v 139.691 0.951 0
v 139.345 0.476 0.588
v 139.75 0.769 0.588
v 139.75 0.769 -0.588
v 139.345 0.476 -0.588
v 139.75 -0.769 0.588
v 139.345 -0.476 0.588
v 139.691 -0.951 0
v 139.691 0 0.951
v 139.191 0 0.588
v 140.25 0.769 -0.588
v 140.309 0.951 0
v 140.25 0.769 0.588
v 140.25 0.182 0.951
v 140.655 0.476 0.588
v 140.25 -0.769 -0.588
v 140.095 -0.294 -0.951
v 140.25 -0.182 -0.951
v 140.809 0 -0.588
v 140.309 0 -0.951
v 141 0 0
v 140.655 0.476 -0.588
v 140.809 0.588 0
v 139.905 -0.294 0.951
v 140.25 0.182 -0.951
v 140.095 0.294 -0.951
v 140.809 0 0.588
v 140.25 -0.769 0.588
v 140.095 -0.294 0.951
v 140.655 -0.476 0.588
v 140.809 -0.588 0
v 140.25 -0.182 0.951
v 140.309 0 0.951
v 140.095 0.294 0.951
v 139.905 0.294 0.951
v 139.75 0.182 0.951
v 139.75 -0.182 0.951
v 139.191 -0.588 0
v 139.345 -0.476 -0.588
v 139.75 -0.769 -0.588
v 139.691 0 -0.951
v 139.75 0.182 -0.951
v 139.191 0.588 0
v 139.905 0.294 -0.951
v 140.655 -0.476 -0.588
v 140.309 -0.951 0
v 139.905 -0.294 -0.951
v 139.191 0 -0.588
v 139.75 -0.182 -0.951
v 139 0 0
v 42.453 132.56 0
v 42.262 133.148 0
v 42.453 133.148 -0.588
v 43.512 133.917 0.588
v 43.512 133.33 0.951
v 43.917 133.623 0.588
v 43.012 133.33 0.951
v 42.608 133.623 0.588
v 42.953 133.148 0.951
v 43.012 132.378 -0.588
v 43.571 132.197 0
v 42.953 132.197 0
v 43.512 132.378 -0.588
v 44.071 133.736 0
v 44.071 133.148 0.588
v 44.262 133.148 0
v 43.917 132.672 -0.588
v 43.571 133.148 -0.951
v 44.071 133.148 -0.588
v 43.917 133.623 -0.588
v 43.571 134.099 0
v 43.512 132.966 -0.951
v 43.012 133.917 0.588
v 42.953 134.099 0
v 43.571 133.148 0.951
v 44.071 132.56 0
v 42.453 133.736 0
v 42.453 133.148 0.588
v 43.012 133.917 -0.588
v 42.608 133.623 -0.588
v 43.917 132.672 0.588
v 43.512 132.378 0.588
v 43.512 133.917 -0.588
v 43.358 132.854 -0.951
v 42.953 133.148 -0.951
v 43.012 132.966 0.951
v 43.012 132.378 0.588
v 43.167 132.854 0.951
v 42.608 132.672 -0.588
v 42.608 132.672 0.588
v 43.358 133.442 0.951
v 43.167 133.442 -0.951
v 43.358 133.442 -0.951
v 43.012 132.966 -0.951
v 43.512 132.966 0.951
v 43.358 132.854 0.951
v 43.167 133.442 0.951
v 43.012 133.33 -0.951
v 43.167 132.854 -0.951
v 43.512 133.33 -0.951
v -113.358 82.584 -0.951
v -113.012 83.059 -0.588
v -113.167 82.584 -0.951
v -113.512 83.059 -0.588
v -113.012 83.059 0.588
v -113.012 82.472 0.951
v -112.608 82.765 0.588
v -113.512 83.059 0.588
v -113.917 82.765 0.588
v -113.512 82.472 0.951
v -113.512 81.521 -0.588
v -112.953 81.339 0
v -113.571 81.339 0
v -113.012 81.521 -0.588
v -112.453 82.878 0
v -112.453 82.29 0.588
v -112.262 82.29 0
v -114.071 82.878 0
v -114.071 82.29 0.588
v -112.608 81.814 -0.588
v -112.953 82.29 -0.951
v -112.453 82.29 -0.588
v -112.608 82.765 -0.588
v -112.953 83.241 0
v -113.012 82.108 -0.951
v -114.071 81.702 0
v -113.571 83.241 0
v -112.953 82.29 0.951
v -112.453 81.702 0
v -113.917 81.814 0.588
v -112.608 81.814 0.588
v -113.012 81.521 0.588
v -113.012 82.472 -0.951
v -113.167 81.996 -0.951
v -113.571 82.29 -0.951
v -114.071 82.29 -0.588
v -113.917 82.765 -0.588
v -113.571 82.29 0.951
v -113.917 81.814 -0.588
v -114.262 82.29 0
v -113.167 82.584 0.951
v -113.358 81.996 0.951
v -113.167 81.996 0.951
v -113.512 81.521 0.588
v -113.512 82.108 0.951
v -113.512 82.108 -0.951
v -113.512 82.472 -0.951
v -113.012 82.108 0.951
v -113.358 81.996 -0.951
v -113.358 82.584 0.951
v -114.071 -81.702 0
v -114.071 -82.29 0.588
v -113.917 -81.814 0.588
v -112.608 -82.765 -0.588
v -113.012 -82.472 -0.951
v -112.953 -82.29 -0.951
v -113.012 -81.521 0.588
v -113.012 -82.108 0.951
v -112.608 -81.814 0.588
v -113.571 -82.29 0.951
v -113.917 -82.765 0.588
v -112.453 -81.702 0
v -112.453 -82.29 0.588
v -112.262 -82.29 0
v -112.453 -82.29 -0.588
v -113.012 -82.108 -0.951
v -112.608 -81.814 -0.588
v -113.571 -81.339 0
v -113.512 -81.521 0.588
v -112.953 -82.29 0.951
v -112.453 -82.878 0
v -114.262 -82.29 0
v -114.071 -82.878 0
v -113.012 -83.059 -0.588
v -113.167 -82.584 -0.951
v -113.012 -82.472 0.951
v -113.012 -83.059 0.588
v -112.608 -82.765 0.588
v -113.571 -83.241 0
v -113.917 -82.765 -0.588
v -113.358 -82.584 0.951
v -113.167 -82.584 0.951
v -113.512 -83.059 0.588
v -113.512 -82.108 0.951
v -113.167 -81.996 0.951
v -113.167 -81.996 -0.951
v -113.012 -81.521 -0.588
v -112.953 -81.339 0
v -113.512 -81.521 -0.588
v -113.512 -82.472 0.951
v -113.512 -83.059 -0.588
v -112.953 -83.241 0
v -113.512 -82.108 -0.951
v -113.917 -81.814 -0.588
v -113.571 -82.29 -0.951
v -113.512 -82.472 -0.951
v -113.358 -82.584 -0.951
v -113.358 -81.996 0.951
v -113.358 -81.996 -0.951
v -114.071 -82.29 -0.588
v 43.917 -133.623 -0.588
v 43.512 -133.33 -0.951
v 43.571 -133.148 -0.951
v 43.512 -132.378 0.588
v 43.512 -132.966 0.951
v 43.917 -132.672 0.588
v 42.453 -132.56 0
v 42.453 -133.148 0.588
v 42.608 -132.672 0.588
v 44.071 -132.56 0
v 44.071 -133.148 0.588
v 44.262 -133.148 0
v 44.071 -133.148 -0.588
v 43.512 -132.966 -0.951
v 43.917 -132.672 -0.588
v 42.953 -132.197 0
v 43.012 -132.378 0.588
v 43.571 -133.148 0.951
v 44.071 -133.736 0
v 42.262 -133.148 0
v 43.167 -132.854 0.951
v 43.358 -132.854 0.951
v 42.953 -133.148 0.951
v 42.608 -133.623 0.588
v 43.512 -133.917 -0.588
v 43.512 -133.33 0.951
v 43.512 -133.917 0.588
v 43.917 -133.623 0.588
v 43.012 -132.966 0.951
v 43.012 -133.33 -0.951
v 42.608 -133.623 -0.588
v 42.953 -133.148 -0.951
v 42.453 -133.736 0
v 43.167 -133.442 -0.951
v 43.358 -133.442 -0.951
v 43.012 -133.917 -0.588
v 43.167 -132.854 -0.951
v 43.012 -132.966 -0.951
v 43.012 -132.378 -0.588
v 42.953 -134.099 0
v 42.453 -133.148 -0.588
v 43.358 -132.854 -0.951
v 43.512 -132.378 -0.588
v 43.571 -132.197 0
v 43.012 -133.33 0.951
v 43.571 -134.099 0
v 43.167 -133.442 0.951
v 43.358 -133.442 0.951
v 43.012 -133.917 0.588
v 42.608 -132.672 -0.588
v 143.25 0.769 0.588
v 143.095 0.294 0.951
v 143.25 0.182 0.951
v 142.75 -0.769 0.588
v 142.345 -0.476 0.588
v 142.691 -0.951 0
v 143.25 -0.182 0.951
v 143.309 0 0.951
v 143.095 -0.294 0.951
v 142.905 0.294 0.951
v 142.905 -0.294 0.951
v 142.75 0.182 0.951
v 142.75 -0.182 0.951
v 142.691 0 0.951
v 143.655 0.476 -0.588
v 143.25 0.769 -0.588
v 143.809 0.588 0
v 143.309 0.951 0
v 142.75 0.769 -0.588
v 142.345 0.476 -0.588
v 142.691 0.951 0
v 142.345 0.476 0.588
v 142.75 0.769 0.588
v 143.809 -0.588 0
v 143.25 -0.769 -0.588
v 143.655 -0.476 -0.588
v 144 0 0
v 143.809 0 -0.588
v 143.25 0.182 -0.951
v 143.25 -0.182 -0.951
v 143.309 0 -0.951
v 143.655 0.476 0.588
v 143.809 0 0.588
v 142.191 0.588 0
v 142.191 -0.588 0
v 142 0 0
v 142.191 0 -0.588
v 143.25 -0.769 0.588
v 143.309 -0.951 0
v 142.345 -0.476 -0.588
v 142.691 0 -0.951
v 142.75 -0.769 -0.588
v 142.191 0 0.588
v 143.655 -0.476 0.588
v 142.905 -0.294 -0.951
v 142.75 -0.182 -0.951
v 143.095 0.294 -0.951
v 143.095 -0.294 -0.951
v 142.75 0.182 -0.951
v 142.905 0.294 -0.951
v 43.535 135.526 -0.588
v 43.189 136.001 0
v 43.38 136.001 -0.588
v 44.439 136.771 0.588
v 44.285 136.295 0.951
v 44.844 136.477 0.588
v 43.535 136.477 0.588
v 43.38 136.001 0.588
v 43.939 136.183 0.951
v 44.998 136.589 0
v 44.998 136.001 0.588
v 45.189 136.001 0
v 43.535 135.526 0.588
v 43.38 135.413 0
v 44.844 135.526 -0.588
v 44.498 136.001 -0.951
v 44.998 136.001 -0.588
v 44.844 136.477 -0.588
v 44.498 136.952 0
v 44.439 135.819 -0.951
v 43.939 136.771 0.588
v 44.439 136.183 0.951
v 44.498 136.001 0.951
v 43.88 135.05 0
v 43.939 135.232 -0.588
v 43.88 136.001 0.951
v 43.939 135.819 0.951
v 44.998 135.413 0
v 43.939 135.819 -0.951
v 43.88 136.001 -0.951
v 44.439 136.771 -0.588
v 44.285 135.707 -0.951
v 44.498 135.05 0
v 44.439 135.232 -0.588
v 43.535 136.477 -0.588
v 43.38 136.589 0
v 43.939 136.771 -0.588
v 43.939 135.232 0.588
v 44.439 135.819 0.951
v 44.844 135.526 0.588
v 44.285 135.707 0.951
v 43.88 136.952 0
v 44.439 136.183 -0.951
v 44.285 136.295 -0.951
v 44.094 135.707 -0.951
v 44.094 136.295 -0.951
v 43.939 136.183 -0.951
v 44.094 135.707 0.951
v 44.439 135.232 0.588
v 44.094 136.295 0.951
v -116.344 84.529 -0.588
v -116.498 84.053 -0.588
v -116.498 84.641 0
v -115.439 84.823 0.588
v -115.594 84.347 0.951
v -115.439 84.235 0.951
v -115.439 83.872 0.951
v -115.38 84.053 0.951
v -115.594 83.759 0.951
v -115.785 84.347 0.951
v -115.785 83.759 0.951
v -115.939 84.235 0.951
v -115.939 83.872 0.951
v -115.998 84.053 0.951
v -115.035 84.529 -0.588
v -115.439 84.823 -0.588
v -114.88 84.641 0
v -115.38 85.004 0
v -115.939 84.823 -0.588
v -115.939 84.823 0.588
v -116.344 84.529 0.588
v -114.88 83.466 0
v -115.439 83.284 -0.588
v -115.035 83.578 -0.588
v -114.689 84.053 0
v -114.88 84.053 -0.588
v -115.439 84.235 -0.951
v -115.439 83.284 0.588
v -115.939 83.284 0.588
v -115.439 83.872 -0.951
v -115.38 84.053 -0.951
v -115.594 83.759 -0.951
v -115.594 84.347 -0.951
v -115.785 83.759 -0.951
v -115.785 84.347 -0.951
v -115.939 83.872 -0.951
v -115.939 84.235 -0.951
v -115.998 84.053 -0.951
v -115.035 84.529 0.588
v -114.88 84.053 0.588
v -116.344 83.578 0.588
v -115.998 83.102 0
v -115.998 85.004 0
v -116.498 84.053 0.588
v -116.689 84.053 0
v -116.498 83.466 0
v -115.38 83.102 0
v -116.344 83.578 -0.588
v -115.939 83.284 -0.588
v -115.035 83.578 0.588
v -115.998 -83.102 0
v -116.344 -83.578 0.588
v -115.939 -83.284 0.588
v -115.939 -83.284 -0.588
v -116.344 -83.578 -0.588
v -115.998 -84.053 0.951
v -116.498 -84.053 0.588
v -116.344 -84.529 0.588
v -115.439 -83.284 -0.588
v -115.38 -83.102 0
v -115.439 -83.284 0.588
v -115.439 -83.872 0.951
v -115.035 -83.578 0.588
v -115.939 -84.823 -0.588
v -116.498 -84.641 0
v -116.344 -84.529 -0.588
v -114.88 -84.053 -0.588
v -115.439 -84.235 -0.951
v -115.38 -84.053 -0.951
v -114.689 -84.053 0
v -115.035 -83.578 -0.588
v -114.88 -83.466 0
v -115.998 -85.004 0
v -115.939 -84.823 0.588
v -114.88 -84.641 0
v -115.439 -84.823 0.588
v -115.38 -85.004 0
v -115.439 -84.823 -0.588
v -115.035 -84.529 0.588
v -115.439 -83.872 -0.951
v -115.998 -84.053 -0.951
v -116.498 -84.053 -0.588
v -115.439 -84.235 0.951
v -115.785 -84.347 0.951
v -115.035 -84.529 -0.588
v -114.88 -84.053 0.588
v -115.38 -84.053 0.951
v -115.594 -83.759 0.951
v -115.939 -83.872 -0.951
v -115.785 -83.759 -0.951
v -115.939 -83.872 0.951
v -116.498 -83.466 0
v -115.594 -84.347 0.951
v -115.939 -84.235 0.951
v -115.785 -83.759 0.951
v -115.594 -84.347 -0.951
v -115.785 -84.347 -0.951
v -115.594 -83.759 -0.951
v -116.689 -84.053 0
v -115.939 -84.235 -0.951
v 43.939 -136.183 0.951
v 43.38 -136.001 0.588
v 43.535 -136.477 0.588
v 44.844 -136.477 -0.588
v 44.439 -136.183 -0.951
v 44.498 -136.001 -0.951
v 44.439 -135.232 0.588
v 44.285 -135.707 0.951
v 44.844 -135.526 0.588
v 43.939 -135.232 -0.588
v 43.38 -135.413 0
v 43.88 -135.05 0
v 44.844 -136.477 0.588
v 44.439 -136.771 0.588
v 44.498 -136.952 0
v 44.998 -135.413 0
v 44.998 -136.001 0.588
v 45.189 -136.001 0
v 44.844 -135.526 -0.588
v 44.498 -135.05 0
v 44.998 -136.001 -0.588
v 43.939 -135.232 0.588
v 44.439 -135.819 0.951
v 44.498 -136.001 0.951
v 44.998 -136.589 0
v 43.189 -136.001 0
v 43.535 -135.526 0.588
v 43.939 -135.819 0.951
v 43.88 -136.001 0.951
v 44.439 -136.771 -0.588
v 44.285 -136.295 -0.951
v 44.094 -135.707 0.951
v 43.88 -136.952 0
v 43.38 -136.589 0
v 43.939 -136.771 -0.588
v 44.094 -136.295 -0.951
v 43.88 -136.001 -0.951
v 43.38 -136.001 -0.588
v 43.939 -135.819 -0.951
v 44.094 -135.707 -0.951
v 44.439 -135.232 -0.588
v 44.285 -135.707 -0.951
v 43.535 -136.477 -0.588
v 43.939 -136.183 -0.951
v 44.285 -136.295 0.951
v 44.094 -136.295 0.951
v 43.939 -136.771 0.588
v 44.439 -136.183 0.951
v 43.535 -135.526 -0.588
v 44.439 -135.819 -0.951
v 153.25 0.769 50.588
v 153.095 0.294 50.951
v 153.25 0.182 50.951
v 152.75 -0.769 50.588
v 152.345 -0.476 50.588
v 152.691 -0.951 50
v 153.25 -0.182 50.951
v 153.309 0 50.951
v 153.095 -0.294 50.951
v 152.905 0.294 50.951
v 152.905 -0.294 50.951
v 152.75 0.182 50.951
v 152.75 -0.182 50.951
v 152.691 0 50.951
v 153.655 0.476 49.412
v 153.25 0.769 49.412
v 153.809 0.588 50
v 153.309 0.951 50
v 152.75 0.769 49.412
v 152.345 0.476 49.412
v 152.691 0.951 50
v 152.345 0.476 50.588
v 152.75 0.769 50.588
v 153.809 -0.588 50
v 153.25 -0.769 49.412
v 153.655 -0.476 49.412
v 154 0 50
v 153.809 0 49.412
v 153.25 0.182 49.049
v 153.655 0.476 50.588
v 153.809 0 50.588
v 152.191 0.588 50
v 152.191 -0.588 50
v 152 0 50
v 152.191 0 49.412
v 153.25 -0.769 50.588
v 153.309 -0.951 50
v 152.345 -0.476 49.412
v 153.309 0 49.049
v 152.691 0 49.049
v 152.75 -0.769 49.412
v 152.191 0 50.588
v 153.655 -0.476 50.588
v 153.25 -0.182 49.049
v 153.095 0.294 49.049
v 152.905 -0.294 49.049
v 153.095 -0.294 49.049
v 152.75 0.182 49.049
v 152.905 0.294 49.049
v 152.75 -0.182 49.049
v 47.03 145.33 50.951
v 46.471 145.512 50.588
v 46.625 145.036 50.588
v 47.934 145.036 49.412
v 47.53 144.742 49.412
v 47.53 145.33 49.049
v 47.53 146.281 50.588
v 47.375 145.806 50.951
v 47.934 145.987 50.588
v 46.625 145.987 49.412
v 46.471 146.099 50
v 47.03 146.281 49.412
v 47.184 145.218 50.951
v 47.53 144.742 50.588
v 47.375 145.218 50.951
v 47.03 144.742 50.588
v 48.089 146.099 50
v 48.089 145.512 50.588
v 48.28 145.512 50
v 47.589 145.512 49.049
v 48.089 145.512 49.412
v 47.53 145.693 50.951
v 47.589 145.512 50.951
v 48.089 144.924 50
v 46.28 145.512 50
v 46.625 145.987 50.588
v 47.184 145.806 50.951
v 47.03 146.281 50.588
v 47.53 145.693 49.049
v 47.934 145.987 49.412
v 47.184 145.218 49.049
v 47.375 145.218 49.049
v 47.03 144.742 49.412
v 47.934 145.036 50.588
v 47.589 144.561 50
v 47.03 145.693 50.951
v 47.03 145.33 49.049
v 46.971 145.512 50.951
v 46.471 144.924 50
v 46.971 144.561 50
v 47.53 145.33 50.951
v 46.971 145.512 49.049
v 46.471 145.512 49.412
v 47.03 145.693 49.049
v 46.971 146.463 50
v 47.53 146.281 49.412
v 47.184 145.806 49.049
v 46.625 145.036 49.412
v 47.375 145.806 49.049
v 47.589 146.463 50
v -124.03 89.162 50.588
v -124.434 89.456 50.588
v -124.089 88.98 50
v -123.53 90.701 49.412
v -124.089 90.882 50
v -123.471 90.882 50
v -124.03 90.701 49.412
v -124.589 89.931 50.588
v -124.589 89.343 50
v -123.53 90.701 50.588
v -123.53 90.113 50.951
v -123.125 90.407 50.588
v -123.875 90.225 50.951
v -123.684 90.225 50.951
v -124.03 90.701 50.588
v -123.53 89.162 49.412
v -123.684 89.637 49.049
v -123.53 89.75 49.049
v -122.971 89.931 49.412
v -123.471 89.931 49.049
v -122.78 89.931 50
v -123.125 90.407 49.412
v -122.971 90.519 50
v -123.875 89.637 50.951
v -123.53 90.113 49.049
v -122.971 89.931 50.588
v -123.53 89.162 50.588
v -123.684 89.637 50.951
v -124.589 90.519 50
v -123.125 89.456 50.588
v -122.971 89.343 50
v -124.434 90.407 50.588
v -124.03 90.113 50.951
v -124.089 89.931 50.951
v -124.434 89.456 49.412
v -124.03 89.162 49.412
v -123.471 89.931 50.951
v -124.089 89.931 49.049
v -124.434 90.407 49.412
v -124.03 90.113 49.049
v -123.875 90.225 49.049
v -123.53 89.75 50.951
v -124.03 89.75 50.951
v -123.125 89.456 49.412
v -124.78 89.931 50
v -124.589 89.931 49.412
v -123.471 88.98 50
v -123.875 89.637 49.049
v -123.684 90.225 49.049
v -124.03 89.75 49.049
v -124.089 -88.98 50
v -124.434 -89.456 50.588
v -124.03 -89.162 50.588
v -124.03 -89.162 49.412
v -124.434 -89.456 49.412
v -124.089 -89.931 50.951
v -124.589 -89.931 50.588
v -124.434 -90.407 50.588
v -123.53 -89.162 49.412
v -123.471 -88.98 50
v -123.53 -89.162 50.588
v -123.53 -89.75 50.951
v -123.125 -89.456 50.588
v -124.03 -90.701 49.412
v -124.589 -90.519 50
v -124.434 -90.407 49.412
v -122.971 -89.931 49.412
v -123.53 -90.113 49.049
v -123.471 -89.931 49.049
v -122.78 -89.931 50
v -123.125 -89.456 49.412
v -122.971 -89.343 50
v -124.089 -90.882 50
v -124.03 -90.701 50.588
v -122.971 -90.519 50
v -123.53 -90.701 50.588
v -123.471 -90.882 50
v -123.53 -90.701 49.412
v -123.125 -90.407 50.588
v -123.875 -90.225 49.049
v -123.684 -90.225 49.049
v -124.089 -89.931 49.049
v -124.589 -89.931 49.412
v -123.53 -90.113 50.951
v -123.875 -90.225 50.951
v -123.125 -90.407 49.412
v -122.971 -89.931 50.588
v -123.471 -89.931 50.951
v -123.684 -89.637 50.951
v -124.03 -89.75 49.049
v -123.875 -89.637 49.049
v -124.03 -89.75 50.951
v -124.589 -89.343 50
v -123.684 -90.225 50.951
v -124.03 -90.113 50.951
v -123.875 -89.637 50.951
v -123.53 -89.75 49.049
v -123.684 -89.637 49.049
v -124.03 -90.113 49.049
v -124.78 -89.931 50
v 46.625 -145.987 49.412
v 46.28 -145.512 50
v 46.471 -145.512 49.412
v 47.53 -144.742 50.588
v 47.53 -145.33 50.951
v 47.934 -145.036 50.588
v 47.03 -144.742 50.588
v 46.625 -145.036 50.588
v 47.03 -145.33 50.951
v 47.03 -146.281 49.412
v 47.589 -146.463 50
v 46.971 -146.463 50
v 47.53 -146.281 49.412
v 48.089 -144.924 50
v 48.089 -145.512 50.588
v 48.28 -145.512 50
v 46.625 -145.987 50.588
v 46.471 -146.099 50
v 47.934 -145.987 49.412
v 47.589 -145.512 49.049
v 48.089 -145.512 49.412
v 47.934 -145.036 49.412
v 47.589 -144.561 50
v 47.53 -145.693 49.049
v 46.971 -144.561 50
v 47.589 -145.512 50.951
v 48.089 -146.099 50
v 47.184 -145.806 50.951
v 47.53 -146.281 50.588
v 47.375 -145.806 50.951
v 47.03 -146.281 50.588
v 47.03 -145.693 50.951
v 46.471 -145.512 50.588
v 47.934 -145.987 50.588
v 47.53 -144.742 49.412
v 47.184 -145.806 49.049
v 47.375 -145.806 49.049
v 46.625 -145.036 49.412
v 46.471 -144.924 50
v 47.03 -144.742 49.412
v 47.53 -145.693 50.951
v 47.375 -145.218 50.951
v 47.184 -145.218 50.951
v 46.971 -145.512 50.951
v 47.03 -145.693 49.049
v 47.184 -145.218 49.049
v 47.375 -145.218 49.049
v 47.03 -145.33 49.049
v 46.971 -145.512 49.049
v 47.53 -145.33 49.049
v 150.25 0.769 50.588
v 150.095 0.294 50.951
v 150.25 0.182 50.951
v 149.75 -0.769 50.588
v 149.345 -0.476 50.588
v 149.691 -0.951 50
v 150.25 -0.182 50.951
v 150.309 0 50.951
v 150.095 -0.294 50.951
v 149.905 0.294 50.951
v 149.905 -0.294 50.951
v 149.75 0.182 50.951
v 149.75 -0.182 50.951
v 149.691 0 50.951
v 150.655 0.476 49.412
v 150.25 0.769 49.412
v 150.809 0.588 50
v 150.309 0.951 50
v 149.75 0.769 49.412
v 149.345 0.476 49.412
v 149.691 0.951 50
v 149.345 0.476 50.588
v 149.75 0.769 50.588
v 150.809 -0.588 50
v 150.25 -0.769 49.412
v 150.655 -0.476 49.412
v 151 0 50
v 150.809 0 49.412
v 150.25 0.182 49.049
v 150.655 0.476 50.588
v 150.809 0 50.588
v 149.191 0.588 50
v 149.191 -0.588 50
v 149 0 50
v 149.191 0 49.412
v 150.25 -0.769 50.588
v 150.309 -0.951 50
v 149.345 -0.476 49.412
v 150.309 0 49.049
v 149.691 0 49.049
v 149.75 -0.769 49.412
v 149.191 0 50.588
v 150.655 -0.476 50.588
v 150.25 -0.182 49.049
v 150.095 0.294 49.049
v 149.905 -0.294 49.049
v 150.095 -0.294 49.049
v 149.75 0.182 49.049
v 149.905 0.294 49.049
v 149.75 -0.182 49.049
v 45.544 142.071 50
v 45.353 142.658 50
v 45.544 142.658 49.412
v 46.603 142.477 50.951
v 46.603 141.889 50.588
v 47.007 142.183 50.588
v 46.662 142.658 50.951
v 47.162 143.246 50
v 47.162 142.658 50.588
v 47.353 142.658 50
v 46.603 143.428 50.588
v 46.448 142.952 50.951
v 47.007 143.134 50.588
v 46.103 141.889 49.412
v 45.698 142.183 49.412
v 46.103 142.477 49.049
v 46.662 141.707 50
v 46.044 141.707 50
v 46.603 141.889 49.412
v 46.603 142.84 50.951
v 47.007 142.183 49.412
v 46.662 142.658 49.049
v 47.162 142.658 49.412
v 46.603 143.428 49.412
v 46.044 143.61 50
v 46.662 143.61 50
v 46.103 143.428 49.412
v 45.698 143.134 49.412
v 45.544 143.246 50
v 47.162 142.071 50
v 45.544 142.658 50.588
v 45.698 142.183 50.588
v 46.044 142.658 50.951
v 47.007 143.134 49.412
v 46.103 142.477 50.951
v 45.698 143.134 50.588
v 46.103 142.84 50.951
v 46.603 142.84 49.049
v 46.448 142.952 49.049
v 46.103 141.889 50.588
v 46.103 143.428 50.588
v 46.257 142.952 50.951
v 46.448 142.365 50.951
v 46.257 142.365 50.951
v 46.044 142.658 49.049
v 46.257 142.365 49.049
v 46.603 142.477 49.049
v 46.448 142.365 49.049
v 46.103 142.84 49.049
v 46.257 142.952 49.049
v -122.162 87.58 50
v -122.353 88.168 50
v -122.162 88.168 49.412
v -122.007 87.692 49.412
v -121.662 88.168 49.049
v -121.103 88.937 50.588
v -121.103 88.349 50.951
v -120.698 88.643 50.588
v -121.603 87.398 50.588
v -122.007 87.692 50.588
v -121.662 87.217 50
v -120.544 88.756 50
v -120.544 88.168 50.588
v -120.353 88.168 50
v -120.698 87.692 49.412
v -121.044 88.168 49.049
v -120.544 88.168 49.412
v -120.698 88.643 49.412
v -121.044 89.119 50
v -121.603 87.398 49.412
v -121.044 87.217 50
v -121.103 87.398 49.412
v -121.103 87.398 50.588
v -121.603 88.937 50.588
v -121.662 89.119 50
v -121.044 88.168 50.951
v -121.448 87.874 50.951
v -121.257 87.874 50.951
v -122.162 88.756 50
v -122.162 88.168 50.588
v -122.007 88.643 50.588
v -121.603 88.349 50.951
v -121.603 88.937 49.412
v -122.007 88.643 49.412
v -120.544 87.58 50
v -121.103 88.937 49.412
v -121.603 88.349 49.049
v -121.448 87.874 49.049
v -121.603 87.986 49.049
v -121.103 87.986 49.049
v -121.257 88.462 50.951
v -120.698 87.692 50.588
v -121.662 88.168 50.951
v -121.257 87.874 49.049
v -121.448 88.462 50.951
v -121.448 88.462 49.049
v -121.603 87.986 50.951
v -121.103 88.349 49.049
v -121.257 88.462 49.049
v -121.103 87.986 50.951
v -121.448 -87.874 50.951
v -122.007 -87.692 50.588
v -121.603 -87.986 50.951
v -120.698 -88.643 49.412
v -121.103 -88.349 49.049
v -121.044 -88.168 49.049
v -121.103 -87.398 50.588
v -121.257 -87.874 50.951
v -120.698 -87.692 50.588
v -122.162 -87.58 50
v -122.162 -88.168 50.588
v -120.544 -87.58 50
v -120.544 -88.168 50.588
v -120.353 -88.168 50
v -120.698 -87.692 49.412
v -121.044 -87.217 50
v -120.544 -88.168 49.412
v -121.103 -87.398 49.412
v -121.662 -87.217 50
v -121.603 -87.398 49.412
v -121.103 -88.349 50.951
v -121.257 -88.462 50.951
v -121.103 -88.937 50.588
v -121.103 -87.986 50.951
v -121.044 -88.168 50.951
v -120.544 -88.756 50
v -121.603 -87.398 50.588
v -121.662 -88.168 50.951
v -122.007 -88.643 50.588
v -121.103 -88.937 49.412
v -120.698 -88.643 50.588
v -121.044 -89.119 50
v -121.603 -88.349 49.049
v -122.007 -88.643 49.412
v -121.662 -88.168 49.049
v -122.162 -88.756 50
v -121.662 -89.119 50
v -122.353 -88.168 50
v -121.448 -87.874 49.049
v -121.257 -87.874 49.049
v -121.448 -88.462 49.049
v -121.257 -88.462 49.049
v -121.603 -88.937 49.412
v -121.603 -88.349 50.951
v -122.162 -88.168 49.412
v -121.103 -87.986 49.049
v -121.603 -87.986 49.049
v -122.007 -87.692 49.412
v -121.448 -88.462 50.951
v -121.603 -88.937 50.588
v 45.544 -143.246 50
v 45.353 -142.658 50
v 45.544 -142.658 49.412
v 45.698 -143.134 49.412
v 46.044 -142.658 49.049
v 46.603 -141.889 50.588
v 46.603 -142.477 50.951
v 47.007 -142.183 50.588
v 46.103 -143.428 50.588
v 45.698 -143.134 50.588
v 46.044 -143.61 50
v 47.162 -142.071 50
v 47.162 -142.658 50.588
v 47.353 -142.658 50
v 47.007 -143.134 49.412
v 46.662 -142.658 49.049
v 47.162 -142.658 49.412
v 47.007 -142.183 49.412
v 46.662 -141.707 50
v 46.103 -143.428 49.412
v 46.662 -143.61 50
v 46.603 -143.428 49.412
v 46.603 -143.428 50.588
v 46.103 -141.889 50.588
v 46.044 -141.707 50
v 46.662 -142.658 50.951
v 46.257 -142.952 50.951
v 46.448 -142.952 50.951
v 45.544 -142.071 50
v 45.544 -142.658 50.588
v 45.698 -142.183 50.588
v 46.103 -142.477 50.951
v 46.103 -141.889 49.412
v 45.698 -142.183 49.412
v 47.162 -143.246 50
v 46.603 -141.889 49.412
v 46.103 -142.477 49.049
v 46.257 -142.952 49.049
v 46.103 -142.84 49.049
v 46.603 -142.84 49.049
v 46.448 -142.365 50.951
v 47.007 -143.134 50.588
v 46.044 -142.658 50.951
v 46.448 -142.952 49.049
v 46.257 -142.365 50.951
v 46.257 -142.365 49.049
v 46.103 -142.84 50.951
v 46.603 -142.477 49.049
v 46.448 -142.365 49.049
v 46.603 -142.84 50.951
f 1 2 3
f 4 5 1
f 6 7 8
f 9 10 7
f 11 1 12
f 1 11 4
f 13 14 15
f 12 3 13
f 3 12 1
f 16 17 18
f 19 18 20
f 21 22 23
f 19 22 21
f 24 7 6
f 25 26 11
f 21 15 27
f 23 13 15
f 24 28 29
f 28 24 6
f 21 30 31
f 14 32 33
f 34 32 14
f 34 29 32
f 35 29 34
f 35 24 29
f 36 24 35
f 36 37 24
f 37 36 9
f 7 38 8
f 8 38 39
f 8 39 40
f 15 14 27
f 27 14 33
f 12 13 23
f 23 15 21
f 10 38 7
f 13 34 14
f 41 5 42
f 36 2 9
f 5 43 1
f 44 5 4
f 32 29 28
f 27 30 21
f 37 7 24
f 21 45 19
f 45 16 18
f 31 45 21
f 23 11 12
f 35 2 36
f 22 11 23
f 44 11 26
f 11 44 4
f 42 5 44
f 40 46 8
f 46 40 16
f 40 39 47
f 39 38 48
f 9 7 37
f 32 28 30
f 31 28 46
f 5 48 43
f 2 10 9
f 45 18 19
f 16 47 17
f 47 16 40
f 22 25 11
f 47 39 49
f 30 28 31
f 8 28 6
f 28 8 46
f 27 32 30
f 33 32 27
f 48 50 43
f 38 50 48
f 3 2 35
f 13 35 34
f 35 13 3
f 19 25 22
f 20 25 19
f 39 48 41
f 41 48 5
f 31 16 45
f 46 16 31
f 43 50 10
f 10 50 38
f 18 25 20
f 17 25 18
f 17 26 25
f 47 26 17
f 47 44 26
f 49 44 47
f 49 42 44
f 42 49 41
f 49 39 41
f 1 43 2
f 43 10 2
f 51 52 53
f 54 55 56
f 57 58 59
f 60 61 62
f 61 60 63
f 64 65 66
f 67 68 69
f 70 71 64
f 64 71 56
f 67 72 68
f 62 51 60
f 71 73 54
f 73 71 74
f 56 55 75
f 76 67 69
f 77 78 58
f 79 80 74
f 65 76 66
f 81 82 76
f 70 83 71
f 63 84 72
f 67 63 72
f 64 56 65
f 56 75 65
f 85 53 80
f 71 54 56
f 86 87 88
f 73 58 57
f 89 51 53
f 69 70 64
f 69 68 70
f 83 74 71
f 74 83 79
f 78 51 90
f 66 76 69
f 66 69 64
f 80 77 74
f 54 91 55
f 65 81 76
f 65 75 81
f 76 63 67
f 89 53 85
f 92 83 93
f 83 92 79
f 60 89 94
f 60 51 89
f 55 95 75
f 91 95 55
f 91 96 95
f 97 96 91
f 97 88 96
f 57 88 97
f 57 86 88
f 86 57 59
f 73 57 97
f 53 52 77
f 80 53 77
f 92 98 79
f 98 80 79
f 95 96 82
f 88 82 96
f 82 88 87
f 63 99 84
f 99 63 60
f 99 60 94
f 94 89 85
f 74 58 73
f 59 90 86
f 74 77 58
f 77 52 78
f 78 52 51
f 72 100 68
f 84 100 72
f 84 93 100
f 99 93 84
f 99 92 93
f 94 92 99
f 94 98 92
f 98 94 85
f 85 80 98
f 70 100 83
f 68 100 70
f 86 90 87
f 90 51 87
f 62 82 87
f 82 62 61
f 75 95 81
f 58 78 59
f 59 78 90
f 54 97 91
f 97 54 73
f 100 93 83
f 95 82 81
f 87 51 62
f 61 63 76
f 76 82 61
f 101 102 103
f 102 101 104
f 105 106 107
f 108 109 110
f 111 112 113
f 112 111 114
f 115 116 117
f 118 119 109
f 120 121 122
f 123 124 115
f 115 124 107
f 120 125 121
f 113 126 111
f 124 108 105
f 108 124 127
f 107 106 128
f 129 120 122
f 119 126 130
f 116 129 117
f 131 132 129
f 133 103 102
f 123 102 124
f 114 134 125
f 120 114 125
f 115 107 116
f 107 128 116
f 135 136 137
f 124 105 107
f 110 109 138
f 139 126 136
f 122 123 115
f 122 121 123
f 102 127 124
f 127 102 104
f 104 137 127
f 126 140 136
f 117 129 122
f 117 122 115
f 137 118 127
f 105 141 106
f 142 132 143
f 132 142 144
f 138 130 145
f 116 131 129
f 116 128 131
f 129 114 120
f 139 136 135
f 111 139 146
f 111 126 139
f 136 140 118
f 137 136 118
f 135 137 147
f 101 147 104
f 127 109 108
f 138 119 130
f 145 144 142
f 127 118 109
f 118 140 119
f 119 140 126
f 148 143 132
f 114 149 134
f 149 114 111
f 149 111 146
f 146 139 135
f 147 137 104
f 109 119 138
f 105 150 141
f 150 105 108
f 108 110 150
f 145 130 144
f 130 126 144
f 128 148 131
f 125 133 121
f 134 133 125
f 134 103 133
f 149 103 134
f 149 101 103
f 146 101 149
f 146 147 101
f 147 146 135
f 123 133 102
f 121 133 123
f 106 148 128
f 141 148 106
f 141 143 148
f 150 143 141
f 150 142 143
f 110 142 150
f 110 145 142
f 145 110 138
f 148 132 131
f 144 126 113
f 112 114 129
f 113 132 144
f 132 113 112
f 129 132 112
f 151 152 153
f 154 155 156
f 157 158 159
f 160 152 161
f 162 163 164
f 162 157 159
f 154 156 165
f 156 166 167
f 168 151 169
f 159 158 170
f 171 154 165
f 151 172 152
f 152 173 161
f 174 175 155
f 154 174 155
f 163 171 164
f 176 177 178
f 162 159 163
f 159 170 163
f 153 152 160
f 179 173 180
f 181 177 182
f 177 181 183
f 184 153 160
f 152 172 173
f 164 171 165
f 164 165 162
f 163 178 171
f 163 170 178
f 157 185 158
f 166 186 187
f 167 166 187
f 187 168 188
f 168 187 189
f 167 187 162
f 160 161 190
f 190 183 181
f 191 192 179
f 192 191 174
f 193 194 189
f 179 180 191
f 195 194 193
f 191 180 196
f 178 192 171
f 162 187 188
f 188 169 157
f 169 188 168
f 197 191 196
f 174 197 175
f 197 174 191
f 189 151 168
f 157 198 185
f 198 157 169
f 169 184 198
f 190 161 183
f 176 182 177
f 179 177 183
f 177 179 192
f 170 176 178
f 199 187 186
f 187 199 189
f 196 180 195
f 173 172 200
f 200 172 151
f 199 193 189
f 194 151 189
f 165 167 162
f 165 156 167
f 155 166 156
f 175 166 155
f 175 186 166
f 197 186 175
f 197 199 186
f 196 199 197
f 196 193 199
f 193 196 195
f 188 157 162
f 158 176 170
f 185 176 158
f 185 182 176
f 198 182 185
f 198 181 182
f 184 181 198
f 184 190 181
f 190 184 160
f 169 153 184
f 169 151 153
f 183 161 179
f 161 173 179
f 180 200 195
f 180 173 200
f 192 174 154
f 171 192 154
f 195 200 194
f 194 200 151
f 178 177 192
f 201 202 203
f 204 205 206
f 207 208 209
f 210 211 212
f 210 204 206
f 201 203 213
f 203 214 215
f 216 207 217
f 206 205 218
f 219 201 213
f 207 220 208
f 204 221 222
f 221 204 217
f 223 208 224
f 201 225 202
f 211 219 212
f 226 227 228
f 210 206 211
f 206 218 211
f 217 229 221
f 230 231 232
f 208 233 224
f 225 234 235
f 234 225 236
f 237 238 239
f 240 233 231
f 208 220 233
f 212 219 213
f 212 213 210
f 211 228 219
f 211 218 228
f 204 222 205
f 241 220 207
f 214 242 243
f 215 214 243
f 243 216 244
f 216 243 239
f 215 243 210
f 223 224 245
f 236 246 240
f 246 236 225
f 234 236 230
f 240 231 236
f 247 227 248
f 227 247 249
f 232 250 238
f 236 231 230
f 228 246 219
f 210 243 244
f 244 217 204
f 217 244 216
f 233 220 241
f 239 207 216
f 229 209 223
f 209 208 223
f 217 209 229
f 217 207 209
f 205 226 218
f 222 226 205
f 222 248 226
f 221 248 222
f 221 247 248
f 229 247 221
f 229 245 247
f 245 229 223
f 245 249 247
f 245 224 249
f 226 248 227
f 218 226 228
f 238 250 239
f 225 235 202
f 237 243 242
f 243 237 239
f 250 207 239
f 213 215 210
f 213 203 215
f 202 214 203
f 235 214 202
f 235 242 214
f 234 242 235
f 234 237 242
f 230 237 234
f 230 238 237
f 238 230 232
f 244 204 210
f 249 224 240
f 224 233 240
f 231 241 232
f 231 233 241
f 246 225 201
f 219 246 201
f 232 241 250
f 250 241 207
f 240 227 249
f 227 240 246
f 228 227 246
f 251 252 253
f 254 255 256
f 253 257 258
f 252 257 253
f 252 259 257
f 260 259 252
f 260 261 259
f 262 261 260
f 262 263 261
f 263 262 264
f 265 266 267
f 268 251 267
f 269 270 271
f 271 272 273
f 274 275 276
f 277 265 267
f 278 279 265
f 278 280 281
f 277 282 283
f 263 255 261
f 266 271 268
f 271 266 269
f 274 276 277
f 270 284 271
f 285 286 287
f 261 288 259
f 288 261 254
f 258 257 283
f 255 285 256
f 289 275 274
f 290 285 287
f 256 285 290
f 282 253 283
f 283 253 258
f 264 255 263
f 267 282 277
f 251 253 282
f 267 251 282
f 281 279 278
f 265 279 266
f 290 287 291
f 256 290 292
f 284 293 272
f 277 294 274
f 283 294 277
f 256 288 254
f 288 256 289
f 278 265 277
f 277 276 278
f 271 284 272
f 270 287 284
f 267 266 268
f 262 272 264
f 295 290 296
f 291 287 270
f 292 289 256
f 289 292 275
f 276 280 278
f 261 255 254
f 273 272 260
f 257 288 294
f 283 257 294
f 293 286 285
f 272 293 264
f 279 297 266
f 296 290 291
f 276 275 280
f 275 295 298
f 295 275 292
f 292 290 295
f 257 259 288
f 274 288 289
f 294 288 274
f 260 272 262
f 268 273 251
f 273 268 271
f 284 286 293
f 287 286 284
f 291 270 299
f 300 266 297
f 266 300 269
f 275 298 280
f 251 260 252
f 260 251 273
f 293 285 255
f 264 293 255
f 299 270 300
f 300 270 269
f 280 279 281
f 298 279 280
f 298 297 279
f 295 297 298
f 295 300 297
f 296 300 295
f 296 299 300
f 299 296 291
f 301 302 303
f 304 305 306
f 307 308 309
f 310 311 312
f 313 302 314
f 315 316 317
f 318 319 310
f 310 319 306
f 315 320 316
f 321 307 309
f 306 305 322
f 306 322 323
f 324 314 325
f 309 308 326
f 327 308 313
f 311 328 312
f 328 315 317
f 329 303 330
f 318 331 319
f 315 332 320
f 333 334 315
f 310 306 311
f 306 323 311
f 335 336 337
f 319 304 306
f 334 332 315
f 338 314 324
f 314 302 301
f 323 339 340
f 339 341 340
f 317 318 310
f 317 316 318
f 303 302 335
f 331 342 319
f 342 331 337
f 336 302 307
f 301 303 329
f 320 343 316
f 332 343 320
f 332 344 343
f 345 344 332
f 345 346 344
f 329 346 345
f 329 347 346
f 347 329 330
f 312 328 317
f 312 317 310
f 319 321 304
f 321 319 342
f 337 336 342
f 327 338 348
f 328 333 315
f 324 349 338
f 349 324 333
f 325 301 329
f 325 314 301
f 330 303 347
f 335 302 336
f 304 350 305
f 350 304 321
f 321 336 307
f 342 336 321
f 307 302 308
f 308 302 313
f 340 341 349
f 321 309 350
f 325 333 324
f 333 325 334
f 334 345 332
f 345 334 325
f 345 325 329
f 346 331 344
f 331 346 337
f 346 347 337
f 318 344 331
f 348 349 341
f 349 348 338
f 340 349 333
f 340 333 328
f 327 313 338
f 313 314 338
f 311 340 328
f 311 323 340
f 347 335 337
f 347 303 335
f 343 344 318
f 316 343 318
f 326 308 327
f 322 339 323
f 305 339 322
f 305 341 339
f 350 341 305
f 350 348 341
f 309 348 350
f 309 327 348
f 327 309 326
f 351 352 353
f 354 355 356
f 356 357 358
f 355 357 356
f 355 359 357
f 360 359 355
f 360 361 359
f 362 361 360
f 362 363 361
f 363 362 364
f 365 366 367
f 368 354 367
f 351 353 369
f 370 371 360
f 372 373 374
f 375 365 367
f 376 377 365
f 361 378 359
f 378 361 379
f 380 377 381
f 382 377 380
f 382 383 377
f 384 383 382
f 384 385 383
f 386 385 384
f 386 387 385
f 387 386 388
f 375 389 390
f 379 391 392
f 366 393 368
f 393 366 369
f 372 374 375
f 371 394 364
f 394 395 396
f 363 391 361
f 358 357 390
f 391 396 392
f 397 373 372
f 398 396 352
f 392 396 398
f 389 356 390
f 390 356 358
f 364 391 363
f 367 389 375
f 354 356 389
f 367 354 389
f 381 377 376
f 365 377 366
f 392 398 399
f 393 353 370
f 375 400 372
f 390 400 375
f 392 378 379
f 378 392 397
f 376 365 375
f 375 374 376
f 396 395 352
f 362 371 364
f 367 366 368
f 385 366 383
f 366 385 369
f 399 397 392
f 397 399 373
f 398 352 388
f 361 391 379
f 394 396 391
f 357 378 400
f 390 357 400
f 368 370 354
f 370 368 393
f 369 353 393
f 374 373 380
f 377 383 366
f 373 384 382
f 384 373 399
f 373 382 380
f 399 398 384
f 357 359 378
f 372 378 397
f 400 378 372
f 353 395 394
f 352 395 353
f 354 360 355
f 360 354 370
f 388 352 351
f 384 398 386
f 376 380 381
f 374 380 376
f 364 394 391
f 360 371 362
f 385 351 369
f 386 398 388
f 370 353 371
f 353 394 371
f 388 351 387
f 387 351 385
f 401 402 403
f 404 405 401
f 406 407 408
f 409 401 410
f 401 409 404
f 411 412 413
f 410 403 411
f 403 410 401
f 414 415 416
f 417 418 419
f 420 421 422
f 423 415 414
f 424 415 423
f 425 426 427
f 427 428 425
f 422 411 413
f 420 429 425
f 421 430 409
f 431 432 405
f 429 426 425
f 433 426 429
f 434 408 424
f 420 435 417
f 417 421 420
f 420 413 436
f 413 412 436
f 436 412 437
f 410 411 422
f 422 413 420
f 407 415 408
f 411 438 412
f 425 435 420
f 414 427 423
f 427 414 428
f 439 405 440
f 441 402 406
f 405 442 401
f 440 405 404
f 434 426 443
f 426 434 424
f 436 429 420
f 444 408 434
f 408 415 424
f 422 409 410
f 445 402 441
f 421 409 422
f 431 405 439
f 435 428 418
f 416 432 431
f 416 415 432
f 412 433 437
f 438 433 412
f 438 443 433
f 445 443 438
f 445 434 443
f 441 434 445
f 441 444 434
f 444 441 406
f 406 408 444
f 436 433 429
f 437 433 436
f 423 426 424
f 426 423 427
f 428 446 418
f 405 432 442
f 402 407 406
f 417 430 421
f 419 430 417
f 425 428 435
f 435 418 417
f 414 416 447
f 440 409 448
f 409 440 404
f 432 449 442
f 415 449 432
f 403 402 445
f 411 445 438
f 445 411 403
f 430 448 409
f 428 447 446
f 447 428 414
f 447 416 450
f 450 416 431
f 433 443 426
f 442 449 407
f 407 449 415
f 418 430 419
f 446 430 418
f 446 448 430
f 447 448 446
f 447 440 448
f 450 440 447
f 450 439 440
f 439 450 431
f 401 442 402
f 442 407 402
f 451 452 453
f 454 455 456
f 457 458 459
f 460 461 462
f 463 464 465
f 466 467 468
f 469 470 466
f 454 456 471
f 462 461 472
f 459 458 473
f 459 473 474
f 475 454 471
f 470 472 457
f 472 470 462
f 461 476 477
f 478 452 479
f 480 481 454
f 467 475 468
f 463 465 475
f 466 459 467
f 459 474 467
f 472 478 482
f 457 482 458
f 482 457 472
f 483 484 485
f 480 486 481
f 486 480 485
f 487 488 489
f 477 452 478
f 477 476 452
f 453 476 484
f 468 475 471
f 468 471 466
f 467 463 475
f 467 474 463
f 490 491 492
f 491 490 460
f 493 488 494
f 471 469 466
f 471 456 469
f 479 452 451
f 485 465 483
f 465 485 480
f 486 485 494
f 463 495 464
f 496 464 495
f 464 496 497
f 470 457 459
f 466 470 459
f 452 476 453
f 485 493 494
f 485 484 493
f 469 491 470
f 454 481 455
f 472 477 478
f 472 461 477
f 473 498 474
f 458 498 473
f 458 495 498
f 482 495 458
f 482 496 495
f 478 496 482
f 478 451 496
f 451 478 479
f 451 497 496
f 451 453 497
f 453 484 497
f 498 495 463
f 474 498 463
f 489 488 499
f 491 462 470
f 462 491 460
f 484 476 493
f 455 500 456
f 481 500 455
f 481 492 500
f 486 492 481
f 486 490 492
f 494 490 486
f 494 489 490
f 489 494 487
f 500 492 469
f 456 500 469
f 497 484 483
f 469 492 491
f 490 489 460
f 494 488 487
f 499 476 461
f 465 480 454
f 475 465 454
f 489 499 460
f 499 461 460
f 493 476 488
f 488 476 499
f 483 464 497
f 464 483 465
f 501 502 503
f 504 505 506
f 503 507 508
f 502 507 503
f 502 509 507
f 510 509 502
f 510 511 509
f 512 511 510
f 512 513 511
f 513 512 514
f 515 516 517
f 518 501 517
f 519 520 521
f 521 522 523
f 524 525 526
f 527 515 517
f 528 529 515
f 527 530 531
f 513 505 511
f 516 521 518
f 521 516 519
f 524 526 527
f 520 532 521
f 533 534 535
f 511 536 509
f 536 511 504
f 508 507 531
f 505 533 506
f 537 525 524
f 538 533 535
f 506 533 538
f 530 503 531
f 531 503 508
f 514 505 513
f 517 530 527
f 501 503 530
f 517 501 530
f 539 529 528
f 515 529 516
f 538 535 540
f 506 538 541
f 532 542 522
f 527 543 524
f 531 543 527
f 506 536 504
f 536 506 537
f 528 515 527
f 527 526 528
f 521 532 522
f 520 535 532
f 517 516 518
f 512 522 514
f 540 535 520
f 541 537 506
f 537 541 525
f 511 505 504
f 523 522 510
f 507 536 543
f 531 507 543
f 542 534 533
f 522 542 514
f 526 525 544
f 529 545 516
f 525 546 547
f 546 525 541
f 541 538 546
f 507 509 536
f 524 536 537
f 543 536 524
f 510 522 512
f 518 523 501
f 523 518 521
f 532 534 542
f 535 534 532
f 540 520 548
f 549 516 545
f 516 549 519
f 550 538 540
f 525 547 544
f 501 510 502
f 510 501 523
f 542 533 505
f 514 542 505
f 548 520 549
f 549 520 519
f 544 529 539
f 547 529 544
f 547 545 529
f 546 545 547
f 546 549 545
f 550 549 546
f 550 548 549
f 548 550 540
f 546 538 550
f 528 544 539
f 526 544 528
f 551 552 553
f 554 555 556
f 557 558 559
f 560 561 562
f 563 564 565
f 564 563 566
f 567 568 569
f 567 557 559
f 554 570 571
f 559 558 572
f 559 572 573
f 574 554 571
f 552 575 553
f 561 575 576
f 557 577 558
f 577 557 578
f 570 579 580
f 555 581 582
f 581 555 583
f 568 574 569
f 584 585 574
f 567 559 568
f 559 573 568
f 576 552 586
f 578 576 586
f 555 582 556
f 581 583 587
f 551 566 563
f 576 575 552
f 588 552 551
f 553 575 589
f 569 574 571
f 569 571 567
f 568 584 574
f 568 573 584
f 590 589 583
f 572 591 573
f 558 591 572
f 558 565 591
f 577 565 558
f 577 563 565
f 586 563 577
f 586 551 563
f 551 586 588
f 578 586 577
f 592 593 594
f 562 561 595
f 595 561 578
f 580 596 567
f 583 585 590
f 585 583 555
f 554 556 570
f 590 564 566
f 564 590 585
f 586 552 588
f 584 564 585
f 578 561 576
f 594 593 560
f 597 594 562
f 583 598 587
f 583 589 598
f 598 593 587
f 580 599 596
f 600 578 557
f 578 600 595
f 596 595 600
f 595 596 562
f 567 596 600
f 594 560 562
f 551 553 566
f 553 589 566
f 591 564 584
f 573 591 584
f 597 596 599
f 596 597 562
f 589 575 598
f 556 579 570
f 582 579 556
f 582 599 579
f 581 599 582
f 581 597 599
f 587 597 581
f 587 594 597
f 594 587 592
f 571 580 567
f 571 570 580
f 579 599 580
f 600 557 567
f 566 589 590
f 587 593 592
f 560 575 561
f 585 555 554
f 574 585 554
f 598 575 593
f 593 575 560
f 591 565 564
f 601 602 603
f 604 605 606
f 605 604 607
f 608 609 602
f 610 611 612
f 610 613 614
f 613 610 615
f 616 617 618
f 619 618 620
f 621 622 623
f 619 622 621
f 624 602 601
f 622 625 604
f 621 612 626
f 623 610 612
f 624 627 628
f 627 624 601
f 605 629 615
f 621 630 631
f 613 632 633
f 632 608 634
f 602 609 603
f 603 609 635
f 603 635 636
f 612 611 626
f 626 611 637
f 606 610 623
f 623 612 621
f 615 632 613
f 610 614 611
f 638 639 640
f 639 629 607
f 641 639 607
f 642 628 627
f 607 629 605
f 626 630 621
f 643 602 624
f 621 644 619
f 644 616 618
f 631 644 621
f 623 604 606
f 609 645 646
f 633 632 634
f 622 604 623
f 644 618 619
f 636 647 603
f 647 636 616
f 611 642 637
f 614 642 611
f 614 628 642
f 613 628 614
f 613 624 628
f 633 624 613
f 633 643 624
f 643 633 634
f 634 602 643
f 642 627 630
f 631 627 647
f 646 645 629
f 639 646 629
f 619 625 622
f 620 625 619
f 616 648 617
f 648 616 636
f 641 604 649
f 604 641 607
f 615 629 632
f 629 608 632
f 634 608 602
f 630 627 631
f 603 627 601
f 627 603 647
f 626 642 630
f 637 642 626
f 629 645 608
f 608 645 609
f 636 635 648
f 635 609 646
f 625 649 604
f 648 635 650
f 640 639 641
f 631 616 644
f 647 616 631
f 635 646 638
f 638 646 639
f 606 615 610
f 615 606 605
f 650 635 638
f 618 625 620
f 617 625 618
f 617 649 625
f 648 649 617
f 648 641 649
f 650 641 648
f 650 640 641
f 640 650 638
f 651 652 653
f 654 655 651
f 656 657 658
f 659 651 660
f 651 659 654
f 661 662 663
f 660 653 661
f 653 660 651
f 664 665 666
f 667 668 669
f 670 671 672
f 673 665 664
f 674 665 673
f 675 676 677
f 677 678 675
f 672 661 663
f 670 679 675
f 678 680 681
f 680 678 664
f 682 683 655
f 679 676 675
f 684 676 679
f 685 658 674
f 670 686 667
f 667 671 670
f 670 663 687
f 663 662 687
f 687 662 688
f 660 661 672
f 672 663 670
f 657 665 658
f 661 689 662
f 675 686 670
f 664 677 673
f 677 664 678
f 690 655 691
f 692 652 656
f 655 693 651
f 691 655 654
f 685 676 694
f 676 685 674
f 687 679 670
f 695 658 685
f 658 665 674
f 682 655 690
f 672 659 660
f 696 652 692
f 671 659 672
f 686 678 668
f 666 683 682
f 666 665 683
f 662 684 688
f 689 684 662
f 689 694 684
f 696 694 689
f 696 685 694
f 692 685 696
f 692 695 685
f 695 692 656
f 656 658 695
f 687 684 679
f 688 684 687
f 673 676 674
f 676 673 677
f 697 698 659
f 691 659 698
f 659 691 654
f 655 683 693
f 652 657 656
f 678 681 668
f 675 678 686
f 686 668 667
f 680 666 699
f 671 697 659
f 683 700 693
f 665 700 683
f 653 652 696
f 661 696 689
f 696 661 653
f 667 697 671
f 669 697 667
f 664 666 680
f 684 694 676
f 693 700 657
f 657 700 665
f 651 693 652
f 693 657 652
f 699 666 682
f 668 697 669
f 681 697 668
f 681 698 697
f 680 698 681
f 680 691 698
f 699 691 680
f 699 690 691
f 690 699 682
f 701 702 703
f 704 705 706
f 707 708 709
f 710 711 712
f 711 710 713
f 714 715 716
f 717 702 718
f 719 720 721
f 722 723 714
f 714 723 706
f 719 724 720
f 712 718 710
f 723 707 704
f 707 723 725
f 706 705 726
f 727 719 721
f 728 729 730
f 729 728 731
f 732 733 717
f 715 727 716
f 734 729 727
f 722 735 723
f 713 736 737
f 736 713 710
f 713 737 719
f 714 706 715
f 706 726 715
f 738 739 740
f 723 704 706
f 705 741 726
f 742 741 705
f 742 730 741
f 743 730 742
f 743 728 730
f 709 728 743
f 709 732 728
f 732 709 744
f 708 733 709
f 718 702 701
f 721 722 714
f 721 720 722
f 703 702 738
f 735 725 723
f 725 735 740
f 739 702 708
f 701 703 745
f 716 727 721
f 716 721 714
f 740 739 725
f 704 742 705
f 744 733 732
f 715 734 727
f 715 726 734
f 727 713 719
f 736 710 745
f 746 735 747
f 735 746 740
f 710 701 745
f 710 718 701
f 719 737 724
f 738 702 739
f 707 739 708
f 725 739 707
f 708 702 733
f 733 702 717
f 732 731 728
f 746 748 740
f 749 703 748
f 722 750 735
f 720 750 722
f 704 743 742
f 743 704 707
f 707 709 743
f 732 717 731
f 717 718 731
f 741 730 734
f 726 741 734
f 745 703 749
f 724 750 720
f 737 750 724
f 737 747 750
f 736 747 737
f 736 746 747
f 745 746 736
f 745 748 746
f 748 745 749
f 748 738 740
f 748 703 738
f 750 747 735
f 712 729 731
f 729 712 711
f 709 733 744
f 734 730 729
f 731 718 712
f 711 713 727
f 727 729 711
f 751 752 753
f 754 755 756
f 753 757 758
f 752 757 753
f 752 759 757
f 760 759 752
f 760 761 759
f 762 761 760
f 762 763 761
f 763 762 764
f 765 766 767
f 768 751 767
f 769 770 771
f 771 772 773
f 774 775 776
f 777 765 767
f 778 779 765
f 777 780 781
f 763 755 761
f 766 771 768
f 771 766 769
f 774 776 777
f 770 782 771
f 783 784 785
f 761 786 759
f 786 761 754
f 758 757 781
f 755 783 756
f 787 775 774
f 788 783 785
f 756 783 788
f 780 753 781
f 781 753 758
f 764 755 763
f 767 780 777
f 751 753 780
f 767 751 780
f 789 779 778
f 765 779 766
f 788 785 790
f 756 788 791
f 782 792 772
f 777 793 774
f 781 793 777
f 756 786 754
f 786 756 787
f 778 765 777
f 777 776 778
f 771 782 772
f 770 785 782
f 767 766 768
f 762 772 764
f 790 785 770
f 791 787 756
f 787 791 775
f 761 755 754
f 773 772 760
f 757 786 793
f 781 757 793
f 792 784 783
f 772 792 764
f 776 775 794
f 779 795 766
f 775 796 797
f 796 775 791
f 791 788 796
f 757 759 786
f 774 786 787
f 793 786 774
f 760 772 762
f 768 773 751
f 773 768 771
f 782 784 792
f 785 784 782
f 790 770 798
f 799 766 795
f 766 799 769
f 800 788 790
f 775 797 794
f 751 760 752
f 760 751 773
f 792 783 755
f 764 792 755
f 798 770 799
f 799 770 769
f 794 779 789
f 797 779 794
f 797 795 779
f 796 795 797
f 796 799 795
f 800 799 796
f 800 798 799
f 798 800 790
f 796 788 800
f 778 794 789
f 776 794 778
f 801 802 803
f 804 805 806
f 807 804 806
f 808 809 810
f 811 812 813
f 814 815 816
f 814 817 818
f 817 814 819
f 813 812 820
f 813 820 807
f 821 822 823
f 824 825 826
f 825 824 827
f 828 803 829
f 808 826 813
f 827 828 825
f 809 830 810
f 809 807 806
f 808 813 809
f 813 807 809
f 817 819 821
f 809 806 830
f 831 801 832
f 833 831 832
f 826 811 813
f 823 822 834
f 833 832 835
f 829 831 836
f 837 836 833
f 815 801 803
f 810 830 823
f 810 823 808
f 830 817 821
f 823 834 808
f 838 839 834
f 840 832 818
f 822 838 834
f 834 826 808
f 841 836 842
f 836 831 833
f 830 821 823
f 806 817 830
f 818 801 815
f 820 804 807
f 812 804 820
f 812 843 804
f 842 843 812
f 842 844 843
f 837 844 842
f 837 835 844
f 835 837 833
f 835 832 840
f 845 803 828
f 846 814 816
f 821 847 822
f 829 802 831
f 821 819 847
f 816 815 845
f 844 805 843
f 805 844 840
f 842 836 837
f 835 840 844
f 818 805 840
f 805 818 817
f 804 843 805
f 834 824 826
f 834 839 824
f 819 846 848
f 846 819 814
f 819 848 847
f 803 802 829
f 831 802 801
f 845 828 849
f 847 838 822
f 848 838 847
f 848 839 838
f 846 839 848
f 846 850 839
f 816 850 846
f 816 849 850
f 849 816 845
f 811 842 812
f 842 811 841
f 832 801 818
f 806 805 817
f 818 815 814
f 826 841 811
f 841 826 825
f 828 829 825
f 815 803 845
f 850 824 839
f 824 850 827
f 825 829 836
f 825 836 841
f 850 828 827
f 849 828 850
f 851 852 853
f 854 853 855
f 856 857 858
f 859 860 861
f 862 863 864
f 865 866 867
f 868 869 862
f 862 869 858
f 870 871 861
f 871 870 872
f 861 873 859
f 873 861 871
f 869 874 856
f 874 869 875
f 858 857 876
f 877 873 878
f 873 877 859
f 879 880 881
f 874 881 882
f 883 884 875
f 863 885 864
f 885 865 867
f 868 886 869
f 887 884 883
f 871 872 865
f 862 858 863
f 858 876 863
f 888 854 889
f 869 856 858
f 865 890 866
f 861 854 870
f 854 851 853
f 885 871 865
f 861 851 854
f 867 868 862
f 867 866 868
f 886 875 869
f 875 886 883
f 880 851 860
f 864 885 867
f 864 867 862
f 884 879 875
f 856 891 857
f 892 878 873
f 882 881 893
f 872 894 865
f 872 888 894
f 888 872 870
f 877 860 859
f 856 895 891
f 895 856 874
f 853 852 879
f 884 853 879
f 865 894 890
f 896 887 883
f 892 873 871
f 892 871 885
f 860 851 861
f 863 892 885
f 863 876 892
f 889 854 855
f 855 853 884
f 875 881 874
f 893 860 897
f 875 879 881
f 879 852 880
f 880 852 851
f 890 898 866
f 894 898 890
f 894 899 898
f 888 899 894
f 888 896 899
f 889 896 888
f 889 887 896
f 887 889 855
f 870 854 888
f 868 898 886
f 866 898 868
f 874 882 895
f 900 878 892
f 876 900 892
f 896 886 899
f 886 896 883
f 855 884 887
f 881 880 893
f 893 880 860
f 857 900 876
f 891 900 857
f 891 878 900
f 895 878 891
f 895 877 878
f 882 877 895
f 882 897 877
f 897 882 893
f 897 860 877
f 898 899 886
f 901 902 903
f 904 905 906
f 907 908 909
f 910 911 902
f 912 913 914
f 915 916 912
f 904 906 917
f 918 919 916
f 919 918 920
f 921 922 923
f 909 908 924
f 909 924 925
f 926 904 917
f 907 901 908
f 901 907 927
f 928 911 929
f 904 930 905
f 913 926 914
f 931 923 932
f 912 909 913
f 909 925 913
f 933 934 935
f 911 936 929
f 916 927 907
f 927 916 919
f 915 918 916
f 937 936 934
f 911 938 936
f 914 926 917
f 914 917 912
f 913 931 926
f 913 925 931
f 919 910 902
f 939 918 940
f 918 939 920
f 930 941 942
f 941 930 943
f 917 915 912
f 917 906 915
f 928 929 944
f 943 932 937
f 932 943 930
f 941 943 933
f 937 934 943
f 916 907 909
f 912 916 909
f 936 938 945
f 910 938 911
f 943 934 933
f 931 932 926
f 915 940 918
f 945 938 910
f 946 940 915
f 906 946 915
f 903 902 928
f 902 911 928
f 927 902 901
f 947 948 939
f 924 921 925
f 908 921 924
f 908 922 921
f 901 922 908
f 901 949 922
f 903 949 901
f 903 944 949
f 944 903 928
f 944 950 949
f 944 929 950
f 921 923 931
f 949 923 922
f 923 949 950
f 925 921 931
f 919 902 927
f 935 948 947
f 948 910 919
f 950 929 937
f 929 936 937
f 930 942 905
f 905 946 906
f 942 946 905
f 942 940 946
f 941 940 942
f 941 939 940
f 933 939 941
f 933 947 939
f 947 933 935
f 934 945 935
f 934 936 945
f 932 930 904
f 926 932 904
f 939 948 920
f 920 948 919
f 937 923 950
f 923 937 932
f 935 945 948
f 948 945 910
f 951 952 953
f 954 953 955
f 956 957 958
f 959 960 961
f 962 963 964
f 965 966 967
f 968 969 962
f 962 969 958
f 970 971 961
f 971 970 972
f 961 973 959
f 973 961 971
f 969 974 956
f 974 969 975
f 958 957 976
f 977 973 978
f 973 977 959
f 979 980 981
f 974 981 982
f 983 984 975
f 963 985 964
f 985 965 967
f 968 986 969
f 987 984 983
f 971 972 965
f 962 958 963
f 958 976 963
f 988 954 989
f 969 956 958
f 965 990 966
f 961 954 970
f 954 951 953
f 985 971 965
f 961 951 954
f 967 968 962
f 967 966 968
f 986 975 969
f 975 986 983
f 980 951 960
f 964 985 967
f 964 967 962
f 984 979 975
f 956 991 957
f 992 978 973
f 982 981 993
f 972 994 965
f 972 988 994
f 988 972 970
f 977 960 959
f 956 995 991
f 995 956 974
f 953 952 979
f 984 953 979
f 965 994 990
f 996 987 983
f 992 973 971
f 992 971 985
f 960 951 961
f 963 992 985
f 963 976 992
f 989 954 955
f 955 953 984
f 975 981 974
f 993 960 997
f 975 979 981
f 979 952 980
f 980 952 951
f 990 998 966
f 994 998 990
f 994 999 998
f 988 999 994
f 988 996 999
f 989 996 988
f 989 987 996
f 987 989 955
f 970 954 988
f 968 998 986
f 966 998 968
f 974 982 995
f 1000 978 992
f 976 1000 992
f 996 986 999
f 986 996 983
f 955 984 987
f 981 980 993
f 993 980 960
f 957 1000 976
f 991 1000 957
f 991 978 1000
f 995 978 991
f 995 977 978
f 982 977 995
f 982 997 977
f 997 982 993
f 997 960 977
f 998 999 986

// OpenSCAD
function between_pts(pt1, pt2, steps=2) =
    assert(steps>1, "There must be at least two steps")
    [
        let(stop=steps-1, step=(pt2-pt1)/stop)
        for(i=[0:stop]) [pt1.x+step.x*i, pt1.y+step.y*i, pt1.z+step.z*i]
    ];

$fn=10;

function circle_list(r, height, steps=$fn) = [
    for(i=[0:steps-1]) [r*cos(360*i/steps), r*sin(360*i/steps), height]
];
// for(pt=circle_list(10, 0)) translate(pt) sphere(1);

function trap_sin(angle) = (
    // The trapezoidal sine function only distributes points evenly for
    // squares.  When used on a rectangle it generates the same number
    // of points on the short and long sides.
    let(angl_ = ((angle<0) ? 360-(-angle) : angle)%360)
    (angl_ < 45) ? angl_/45 :
    (angl_ < 135) ? 1 :
    (angl_ < 225) ? (180-angl_)/45 :
    (angl_ < 315) ? -1 :
                    (angl_-360)/45
);
function trap_cos(angle) = trap_sin(angle+90);

function man_sin(angle, x, y) = (
    // The true Manhattan sine function takes into account the angle
    // from the origin to x,y - not sure how to explain this.
    let(
        angl_ = ((angle<0) ? 360-(-angle) : angle)%360,
        break_angle = atan2(y, x)
    )
    (angl_ < break_angle) ? angl_/break_angle :
    (angl_ < (180 - break_angle)) ? 1 :
    (angl_ < (180 + break_angle)) ? (180-angl_)/break_angle :
    (angl_ < (360 - break_angle)) ? -1 :
                          (angl_-360)/break_angle
);
function man_cos(angle, x, y) = man_sin(angle+90, y, x);

function rectangle_list(x, y, height, steps=$fn) = [
    // for(i=[0:steps-1]) [x*trap_cos(360*i/steps), y*trap_sin(360*i/steps), height]
    for(i=[0:steps-1]) [x*man_cos(360*i/steps, x, y), y*man_sin(360*i/steps, x, y), height]
];

// for(pt=rectangle_list(160, 120, 1, steps=97*2)) translate(pt) color("green") sphere(1);

function band_points(band, bands, steps) = [
    let(all_steps=bands*steps, bandsm1 = bands-1)
    // def face_for_division(division, divisions, layers=2):
    // def point(a, b):
    //     return ((a + division) * bands + b) % (divisions*bands)
    // # Each face has to be iterated clockwise from the perspective of someone
    // # outside the pipe looking into that face.
    // for i in range(bands):
    //     ni = (i + 1) % bands
    //     yield (point(0, i), point(1, i), point(1, ni), point(0, ni))
    //    [0, 1, 5, 4], [1, 2, 6, 5], [2, 3, 7, 6], [3, 4, 0, 7],
    each for(i=[0:steps*2-1]) [
        let(
            base=band*bands,
            ni = (i+1) % bandsm1,
            bs = bandsm1
        )
        [base+i, base+ni, base+(bs+ni), base+bs+i]
    ]
];
echo(bpoints=band_points(0, 5, 2));
echo(bpoints=band_points(1, 5, 2));

module polygon_ring_constructor(
    outer_1, outer_2, inner_2, inner_1, steps=2, interpolate_flats=false
) {
    // The exact meaning of each list, and whether points in 'outer' lists
    // are 'outside' points in 'inner' lists, isn't important; but points
    // in element I of the four lists in the given order MUST form a 
    listlen = len(outer_1);
    assert(len(outer_2)==listlen, "Outer list 2 must be the same length as outer list 1");
    assert(len(inner_2)==listlen, "Inner list 2 must be the same length as outer list 1");
    assert(len(inner_1)==listlen, "Inner list 1 must be the same length as outer list 1");
    points = [ for(i=[0:listlen-1]) each [
        each between_pts(outer_1[i], outer_2[i], steps),
        if(interpolate_flats)
            each between_pts(outer_2[i], inner_2[i], steps),
        each between_pts(inner_2[i], inner_1[i], steps),
        if(interpolate_flats)
            each between_pts(inner_1[i], outer_1[i], steps),
    ]];
    for(pt=outer_1) translate(pt) color("red") sphere(1);
    for(pt=outer_2) translate(pt) color("yellow") sphere(1);
    for(pt=inner_2) translate(pt) color("green") sphere(1);
    for(pt=inner_1) translate(pt) color("blue") sphere(1);
    faces = [
        // [0, 1, 2, 3], [4, 5, 6, 7],
        // [0, 1, 5, 4], [1, 2, 6, 5], [2, 3, 7, 6], [3, 0, 4, 7],
        each band_points(0, 5, 2),
        // [49*4+0, 49*4+1, 1, 0],
        // for(i=[0:listlen-1]) each band_points(i, steps, listlen)
        // each band_points(0, listlen, steps),
        // each band_points(1, listlen, steps),
        [5, 6, 10, 9], [6, 7, 11, 10], [7, 8, 12, 11], [8, 5, 9, 12]
    ];
    // echo(points=points);
    polyhedron(points=points, faces=faces);
}

steps=5; height=50;
polygon_ring_constructor(
    //rectangle_list(120+3, 160+3, 0, steps=steps),
    // rectangle_list(120, 160, 0, steps=steps),
    circle_list(140, 0, steps=steps),
    circle_list(140+3, 0, steps=steps),
    circle_list(150+3, height, steps=steps),
    circle_list(150, height, steps=steps)
);
